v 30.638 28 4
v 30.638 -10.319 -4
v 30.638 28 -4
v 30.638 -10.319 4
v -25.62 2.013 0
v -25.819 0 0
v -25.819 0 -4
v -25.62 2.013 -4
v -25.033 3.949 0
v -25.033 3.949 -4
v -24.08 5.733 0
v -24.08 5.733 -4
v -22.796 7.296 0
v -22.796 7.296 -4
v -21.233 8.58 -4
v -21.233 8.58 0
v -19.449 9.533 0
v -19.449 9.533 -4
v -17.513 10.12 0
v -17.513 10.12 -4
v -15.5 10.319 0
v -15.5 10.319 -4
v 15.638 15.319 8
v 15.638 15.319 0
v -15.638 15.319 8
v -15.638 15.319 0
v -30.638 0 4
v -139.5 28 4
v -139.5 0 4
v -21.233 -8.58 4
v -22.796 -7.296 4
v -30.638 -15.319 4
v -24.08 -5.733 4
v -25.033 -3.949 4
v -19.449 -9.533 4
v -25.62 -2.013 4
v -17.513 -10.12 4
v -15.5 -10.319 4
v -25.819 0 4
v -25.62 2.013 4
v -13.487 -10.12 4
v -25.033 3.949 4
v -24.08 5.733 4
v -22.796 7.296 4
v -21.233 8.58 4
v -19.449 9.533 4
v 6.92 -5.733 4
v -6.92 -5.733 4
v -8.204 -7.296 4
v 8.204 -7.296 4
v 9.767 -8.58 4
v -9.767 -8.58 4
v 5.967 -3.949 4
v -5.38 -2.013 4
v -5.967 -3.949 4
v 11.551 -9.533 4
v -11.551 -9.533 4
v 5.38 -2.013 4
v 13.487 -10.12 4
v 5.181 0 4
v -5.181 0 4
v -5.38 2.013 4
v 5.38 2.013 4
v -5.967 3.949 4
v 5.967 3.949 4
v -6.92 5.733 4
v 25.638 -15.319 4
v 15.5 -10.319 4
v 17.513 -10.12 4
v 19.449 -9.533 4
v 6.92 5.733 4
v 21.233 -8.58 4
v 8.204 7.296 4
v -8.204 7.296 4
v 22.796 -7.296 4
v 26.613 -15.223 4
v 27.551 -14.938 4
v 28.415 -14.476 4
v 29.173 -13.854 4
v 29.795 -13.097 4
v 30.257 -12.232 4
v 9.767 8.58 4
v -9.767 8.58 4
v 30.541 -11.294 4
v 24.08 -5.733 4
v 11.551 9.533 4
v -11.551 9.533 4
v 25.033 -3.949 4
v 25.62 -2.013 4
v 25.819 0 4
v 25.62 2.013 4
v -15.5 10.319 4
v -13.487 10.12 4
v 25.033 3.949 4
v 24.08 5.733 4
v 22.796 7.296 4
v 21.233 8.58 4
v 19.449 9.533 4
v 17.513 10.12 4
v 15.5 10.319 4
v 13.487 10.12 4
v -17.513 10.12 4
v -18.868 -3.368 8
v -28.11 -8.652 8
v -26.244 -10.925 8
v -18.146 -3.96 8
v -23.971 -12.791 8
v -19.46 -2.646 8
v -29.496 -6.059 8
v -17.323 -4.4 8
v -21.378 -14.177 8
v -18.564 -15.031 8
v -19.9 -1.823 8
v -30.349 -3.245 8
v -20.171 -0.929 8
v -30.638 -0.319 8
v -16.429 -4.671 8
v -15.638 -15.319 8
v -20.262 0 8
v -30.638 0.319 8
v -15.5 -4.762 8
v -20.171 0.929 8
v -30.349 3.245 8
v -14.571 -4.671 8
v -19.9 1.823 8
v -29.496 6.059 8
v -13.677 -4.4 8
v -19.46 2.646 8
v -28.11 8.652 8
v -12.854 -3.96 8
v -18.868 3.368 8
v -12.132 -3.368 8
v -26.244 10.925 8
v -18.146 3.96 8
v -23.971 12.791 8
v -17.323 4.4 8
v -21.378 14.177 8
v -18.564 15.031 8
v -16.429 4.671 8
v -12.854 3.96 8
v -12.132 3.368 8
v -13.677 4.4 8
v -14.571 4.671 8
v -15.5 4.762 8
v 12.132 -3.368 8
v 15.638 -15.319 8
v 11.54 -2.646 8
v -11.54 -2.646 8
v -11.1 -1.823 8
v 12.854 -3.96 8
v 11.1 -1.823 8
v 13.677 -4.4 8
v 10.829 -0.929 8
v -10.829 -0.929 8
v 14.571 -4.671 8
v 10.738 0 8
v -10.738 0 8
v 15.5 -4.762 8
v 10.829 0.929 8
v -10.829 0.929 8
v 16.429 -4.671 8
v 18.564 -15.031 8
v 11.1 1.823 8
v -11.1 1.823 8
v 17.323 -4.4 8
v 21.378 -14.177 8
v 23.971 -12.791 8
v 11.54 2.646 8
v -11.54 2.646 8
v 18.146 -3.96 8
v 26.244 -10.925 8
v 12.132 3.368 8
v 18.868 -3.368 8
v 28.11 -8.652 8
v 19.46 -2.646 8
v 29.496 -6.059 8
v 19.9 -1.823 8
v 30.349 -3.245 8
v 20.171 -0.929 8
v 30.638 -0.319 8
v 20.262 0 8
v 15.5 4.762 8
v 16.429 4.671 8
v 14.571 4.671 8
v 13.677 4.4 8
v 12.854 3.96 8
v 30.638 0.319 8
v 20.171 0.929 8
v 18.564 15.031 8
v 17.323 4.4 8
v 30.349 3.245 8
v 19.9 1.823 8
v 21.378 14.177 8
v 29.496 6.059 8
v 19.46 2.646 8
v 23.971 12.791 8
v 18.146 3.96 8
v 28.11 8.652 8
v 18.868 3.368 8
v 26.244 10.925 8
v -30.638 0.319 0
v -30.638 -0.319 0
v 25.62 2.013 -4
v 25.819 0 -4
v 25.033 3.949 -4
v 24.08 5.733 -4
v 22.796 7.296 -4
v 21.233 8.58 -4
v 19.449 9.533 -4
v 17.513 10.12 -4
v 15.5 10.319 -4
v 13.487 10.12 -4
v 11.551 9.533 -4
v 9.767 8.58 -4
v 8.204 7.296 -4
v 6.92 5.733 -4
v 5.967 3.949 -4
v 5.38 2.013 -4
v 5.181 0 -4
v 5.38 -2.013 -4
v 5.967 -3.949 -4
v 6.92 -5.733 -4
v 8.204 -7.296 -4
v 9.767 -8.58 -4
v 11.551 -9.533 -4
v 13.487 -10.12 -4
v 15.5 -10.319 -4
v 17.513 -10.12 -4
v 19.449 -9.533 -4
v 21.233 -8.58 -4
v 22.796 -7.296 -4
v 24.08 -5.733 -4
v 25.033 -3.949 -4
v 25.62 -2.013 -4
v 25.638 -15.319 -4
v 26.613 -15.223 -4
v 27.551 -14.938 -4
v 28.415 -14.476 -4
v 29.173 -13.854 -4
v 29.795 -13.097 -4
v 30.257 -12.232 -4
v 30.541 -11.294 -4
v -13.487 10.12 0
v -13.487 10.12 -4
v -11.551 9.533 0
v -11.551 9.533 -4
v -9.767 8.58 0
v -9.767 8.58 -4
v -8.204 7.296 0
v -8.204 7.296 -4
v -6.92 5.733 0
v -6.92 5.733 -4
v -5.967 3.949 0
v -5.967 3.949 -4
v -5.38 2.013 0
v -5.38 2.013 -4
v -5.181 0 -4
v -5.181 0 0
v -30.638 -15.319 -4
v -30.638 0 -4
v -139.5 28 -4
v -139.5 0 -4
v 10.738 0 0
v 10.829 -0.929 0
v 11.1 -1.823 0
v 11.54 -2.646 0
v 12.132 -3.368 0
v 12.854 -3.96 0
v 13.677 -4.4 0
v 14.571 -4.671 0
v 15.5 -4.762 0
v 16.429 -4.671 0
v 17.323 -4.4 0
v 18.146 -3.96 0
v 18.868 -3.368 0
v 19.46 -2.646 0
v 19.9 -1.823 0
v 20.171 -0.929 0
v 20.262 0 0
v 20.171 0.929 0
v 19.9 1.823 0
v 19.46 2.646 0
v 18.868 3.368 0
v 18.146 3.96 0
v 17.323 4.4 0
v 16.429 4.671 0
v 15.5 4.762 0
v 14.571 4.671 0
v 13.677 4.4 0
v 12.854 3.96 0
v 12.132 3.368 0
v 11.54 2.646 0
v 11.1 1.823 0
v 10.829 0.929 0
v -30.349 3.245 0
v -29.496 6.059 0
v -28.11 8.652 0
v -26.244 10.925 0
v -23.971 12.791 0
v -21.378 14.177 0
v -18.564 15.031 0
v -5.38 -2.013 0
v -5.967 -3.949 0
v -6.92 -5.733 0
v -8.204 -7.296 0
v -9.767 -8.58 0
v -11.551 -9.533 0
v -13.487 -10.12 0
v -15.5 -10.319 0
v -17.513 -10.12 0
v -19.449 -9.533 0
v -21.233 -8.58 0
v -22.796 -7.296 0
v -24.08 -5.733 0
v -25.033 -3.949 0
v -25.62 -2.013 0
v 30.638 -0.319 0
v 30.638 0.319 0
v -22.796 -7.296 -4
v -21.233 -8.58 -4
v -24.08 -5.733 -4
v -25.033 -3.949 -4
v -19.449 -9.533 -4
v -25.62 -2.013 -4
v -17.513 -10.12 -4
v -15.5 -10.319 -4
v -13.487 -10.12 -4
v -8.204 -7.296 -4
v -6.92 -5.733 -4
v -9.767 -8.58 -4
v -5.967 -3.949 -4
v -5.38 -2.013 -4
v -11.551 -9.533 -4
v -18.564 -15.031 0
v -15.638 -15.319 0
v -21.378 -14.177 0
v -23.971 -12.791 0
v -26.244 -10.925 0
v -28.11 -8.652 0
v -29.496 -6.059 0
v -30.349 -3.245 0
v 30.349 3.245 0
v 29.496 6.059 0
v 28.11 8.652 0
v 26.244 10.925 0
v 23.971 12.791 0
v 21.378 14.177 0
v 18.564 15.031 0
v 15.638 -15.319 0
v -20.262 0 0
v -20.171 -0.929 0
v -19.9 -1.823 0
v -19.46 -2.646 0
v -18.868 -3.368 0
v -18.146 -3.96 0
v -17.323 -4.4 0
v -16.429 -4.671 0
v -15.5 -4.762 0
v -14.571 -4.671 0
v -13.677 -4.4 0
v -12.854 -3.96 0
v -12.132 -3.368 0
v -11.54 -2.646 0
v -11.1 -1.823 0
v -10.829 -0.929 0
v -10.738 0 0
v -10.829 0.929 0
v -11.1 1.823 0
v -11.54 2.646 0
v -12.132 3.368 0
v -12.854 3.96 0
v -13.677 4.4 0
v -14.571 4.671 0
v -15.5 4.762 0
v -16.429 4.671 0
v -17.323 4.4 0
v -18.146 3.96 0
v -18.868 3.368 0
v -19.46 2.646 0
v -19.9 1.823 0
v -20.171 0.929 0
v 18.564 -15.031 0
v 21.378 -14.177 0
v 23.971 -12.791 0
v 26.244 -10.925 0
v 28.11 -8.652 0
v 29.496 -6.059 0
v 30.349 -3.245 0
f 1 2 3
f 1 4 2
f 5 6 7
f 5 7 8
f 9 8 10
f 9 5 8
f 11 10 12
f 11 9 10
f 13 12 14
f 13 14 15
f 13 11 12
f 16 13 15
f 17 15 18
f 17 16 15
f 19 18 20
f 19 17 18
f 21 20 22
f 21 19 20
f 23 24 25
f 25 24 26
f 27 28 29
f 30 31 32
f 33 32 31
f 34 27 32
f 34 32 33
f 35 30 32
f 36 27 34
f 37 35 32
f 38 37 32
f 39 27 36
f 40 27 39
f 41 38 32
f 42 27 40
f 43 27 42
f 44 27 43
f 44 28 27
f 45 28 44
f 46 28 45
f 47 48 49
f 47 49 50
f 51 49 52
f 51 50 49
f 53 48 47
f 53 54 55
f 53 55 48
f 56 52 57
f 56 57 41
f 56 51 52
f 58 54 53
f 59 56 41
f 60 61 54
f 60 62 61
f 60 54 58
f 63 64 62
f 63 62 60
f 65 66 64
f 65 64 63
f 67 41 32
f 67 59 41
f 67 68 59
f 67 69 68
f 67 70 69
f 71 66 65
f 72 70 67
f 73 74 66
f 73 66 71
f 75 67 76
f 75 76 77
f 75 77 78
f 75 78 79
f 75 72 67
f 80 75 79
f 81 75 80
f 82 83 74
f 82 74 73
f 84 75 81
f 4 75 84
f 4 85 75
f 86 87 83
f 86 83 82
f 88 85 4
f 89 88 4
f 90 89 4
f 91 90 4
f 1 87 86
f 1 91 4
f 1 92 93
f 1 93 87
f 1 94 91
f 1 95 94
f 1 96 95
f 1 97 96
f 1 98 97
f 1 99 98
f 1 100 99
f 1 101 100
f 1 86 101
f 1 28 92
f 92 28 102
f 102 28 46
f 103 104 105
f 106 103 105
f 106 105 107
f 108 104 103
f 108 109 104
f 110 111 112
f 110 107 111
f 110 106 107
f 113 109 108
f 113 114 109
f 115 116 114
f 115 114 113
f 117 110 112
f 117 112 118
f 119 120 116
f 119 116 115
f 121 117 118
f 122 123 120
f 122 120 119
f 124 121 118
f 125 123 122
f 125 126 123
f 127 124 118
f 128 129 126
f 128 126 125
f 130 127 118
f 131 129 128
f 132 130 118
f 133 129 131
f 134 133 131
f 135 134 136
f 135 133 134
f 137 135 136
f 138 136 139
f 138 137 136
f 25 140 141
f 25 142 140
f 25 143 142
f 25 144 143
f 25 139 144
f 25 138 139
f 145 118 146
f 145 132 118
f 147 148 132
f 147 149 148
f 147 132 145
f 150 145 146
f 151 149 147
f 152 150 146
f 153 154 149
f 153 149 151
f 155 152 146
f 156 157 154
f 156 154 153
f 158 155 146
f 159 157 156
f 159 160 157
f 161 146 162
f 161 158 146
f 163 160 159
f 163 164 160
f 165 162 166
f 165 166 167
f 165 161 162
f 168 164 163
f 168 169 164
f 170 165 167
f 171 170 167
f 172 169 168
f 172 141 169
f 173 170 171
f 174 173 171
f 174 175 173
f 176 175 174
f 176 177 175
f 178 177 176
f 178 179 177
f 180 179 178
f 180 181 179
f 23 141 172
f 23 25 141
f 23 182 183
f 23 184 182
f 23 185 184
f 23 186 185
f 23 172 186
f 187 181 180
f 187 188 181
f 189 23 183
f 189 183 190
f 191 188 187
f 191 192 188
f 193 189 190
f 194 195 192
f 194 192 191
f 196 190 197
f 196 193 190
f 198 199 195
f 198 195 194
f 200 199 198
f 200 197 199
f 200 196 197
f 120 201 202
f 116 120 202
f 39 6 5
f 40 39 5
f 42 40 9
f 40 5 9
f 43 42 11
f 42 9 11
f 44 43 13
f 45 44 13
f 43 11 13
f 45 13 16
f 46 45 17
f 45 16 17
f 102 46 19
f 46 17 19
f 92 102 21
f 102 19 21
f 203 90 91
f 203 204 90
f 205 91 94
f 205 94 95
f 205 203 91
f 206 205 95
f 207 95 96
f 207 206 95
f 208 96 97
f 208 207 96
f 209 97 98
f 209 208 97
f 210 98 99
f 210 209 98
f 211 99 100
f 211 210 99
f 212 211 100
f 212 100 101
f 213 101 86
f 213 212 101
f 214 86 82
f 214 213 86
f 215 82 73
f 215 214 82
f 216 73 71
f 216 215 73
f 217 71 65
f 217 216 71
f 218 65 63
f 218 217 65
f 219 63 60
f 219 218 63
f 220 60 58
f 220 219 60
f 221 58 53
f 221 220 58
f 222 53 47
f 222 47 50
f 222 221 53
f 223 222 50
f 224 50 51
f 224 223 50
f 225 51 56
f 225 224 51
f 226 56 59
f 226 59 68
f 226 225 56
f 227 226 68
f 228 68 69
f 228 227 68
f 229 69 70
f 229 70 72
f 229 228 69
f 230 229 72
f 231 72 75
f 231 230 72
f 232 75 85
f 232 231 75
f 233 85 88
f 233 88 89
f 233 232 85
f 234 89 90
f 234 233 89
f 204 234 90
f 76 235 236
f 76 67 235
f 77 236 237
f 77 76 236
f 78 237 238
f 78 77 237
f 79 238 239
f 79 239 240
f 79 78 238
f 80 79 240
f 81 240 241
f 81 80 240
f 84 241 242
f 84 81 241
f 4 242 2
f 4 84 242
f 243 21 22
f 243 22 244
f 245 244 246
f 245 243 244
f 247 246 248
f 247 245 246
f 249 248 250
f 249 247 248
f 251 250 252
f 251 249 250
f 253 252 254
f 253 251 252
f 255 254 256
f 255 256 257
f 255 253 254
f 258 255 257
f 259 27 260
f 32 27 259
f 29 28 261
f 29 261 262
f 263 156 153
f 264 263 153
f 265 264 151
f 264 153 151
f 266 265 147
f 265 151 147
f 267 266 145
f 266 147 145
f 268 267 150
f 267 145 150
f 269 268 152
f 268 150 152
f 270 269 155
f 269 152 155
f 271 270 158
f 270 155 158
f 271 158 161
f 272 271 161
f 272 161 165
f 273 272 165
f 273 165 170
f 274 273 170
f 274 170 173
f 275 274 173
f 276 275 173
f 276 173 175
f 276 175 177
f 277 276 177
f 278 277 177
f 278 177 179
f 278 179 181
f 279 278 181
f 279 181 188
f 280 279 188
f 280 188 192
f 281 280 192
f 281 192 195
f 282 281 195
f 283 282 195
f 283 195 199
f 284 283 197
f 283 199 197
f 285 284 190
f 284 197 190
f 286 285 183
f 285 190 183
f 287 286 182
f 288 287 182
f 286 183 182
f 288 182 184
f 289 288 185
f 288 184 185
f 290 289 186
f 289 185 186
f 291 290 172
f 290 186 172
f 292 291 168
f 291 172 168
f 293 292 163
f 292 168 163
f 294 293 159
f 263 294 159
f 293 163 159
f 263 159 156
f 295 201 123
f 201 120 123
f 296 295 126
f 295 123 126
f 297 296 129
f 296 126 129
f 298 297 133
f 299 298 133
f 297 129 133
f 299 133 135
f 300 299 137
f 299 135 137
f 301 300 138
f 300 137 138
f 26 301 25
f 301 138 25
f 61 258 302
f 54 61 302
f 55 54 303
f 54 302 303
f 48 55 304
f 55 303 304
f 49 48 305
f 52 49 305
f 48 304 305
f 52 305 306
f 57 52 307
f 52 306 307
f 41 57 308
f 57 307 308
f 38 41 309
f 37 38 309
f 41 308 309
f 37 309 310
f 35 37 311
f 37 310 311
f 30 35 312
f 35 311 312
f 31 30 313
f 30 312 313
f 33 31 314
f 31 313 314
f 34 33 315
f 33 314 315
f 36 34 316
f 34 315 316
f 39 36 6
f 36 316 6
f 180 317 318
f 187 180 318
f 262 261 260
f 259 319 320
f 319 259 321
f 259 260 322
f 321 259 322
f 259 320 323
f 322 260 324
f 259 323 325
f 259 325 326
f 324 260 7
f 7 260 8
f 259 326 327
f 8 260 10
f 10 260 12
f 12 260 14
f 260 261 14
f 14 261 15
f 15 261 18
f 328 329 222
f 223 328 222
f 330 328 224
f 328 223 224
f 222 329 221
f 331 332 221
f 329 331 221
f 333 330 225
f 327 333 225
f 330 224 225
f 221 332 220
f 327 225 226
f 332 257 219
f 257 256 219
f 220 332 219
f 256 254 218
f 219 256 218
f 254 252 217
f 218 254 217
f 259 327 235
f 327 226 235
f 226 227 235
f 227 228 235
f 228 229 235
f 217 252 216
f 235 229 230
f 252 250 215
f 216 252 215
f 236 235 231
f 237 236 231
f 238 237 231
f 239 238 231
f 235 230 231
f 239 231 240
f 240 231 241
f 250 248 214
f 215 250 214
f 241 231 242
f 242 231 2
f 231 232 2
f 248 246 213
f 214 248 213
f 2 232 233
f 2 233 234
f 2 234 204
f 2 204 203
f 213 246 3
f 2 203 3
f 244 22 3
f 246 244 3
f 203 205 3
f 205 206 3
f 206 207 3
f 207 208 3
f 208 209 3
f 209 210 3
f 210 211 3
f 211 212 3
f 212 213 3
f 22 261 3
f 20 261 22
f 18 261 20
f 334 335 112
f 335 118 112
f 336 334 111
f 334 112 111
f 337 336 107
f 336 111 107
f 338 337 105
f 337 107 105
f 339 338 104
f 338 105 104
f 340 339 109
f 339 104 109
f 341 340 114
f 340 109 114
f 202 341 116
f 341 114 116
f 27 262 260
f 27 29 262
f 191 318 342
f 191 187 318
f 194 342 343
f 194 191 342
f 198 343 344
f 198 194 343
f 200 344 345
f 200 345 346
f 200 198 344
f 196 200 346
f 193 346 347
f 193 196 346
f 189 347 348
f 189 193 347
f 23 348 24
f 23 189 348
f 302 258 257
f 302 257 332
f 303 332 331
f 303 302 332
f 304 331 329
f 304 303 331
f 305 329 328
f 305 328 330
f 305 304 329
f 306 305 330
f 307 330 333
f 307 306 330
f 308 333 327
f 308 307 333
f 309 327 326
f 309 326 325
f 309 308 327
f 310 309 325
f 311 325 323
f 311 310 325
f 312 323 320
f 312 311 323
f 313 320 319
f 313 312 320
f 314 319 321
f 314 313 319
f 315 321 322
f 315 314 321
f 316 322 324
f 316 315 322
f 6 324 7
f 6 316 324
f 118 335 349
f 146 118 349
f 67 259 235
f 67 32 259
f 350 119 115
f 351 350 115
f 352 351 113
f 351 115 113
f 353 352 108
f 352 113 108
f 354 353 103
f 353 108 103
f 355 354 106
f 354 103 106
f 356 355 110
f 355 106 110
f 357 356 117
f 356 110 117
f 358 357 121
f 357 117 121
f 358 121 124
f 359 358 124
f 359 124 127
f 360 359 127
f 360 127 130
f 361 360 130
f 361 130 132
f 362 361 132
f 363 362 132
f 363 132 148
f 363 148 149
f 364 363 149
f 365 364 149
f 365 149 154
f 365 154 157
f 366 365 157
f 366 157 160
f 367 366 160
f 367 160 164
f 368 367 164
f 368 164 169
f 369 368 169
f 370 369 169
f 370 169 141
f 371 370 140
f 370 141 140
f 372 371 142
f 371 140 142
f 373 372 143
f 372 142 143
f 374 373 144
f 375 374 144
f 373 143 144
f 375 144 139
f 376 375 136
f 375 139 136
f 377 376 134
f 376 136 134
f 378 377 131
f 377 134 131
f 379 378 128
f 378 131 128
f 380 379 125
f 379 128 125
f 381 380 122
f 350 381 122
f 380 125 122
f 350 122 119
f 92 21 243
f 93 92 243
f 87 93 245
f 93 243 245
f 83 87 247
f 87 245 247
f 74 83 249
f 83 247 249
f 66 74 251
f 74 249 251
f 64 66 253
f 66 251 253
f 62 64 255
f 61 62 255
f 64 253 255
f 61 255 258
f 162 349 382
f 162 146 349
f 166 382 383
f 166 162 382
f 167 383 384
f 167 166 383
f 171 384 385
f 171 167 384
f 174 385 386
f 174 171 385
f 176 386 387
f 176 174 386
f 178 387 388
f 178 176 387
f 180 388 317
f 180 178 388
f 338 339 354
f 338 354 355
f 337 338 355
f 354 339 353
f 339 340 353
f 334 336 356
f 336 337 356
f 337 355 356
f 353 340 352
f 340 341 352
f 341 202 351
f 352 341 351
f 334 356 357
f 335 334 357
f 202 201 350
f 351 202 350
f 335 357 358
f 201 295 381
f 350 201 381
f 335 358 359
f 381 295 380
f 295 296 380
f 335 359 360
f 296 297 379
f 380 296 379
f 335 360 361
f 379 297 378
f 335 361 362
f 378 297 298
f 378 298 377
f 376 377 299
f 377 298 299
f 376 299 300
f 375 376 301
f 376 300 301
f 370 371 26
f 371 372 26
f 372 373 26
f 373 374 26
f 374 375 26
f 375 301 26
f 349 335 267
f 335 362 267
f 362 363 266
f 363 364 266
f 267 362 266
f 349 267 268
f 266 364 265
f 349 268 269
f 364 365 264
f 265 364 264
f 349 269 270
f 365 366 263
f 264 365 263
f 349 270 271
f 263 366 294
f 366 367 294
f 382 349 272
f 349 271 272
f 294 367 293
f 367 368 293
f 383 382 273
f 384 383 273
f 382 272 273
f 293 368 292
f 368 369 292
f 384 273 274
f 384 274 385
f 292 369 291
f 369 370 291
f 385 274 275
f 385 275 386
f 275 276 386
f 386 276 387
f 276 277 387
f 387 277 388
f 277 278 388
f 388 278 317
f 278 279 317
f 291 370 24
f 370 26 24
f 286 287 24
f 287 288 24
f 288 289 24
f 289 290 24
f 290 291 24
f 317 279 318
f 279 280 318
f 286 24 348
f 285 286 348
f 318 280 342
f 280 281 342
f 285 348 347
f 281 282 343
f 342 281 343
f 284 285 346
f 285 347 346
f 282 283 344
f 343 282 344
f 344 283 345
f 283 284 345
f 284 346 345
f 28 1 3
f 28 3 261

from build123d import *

# Parameters (mm, degrees)
F0_W     = 30.6375
F0_H     = 30.6375
F0_R     = 10.31875
F0_W_2   = 15.1375
F0_H_2   = 12.68125
F1_DEPTH = 4
F2_DEPTH = 8
F3_D     = 9.525
F4_R     = 15
F5_R     = 5


# Not quite as in the source:
# - a length typed as a fraction of an inch, garbled in the dataset ("3 / 203.2 mm" for 3/8 in), is restored


with BuildPart() as f1:
    # F0 (on Top) → F1 (new body, symmetric)
    with BuildSketch(Plane.XY):
        with BuildLine():
            Line((-30.6375, -15.31875), (0, -15.31875))
            Line((0, -15.31875), (0, 15.31875))
            Line((0, 15.31875), (-15.5, 15.31875))
            Line((-15.5, 15.31875), (-15.5, 10.31875))
            ThreePointArc((-15.5, 10.31875), (-8.2035419016, 7.2964580984), (-5.18125, 0))
            ThreePointArc((-5.18125, 0), (-15.5, -10.31875), (-25.81875, 0))
            Line((-25.81875, 0), (-30.6375, 0))
            Line((-30.6375, 0), (-30.6375, -15.31875))
        make_face()
        with BuildLine():
            Line((-30.6375, 15.31875), (-30.6375, 0))
            Line((-30.6375, 0), (-25.81875, 0))
            ThreePointArc((-25.81875, 0), (-22.7964580984, 7.2964580984), (-15.5, 10.31875))
            Line((-15.5, 10.31875), (-15.5, 15.31875))
            Line((-15.5, 15.31875), (-30.6375, 15.31875))
        make_face()
        with Locations((15.31875, 0)):
            Rectangle(F0_W, F0_H)
        with Locations((15.5, 0)):
            Circle(F0_R, mode=Mode.SUBTRACT)
        with BuildLine():
            Line((-30.6375, -15.31875), (0, -15.31875))
            Line((0, -15.31875), (0, 15.31875))
            Line((0, 15.31875), (-15.5, 15.31875))
            Line((-15.5, 15.31875), (-15.5, 10.31875))
            ThreePointArc((-15.5, 10.31875), (-8.2035419016, 7.2964580984), (-5.18125, 0))
            ThreePointArc((-5.18125, 0), (-15.5, -10.31875), (-25.81875, 0))
            Line((-25.81875, 0), (-30.6375, 0))
            Line((-30.6375, 0), (-30.6375, -15.31875))
        make_face()
        Polygon((0, 15.31875), (30.6375, 15.31875), (30.6375, 28), (-15.5, 28), (-15.5, 15.31875), align=None)
        with Locations((-23.06875, 21.659375)):
            Rectangle(F0_W_2, F0_H_2)
        Polygon((-139.5, 0), (-30.6375, 0), (-30.6375, 15.31875), (-30.6375, 28), (-139.5, 28), align=None)
    extrude(amount=F1_DEPTH, both=True)

    # F5
    f5_edges = [f1.edges().sort_by_distance(p)[0] for p in [
        (30.6375, -15.31875, 0),
    ]]
    fillet(f5_edges, radius=F5_R)


with BuildPart() as f2:
    # F0 (on Top) → F2 (new body)
    with BuildSketch(Plane.XY):
        with BuildLine():
            Line((-30.6375, -15.31875), (0, -15.31875))
            Line((0, -15.31875), (0, 15.31875))
            Line((0, 15.31875), (-15.5, 15.31875))
            Line((-15.5, 15.31875), (-15.5, 10.31875))
            ThreePointArc((-15.5, 10.31875), (-8.2035419016, 7.2964580984), (-5.18125, 0))
            ThreePointArc((-5.18125, 0), (-15.5, -10.31875), (-25.81875, 0))
            Line((-25.81875, 0), (-30.6375, 0))
            Line((-30.6375, 0), (-30.6375, -15.31875))
        make_face()
        with BuildLine():
            Line((-30.6375, 15.31875), (-30.6375, 0))
            Line((-30.6375, 0), (-25.81875, 0))
            ThreePointArc((-25.81875, 0), (-22.7964580984, 7.2964580984), (-15.5, 10.31875))
            Line((-15.5, 10.31875), (-15.5, 15.31875))
            Line((-15.5, 15.31875), (-30.6375, 15.31875))
        make_face()
        with BuildLine():
            Line((-30.6375, -15.31875), (0, -15.31875))
            Line((0, -15.31875), (0, 15.31875))
            Line((0, 15.31875), (-15.5, 15.31875))
            Line((-15.5, 15.31875), (-15.5, 10.31875))
            ThreePointArc((-15.5, 10.31875), (-8.2035419016, 7.2964580984), (-5.18125, 0))
            ThreePointArc((-5.18125, 0), (-15.5, -10.31875), (-25.81875, 0))
            Line((-25.81875, 0), (-30.6375, 0))
            Line((-30.6375, 0), (-30.6375, -15.31875))
        make_face()
        with Locations((15.31875, 0)):
            Rectangle(F0_W, F0_H)
        with Locations((15.5, 0)):
            Circle(F0_R, mode=Mode.SUBTRACT)
        with Locations((15.5, 0)):
            Circle(F0_R)
        with BuildLine():
            Line((-15.5, 0), (-25.81875, 0))
            ThreePointArc((-25.81875, 0), (-15.5, -10.31875), (-5.18125, 0))
            ThreePointArc((-5.18125, 0), (-8.2035419016, 7.2964580984), (-15.5, 10.31875))
            Line((-15.5, 10.31875), (-15.5, 0))
        make_face()
        with BuildLine():
            ThreePointArc((-15.5, 10.31875), (-22.7964580984, 7.2964580984), (-25.81875, 0))
            Line((-25.81875, 0), (-15.5, 0))
            Line((-15.5, 0), (-15.5, 10.31875))
        make_face()
    extrude(amount=F2_DEPTH)

    # F3 (through all)
    with Locations(Plane(origin=(0, 0, 0), x_dir=(1, 0, 0), z_dir=(0, 0, -1))):
        with Locations((-15.5, 0), (15.5, 0)):
            Hole(F3_D / 2)

    # F4
    f4_edges = [f2.edges().sort_by_distance(p)[0] for p in [
        (30.6375, 15.31875, 4),
        (30.6375, -15.31875, 4),
        (-30.6375, -15.31875, 4),
        (-30.6375, 15.31875, 4),
    ]]
    fillet(f4_edges, radius=F4_R)


solid = Compound([f1.part, f2.part])
